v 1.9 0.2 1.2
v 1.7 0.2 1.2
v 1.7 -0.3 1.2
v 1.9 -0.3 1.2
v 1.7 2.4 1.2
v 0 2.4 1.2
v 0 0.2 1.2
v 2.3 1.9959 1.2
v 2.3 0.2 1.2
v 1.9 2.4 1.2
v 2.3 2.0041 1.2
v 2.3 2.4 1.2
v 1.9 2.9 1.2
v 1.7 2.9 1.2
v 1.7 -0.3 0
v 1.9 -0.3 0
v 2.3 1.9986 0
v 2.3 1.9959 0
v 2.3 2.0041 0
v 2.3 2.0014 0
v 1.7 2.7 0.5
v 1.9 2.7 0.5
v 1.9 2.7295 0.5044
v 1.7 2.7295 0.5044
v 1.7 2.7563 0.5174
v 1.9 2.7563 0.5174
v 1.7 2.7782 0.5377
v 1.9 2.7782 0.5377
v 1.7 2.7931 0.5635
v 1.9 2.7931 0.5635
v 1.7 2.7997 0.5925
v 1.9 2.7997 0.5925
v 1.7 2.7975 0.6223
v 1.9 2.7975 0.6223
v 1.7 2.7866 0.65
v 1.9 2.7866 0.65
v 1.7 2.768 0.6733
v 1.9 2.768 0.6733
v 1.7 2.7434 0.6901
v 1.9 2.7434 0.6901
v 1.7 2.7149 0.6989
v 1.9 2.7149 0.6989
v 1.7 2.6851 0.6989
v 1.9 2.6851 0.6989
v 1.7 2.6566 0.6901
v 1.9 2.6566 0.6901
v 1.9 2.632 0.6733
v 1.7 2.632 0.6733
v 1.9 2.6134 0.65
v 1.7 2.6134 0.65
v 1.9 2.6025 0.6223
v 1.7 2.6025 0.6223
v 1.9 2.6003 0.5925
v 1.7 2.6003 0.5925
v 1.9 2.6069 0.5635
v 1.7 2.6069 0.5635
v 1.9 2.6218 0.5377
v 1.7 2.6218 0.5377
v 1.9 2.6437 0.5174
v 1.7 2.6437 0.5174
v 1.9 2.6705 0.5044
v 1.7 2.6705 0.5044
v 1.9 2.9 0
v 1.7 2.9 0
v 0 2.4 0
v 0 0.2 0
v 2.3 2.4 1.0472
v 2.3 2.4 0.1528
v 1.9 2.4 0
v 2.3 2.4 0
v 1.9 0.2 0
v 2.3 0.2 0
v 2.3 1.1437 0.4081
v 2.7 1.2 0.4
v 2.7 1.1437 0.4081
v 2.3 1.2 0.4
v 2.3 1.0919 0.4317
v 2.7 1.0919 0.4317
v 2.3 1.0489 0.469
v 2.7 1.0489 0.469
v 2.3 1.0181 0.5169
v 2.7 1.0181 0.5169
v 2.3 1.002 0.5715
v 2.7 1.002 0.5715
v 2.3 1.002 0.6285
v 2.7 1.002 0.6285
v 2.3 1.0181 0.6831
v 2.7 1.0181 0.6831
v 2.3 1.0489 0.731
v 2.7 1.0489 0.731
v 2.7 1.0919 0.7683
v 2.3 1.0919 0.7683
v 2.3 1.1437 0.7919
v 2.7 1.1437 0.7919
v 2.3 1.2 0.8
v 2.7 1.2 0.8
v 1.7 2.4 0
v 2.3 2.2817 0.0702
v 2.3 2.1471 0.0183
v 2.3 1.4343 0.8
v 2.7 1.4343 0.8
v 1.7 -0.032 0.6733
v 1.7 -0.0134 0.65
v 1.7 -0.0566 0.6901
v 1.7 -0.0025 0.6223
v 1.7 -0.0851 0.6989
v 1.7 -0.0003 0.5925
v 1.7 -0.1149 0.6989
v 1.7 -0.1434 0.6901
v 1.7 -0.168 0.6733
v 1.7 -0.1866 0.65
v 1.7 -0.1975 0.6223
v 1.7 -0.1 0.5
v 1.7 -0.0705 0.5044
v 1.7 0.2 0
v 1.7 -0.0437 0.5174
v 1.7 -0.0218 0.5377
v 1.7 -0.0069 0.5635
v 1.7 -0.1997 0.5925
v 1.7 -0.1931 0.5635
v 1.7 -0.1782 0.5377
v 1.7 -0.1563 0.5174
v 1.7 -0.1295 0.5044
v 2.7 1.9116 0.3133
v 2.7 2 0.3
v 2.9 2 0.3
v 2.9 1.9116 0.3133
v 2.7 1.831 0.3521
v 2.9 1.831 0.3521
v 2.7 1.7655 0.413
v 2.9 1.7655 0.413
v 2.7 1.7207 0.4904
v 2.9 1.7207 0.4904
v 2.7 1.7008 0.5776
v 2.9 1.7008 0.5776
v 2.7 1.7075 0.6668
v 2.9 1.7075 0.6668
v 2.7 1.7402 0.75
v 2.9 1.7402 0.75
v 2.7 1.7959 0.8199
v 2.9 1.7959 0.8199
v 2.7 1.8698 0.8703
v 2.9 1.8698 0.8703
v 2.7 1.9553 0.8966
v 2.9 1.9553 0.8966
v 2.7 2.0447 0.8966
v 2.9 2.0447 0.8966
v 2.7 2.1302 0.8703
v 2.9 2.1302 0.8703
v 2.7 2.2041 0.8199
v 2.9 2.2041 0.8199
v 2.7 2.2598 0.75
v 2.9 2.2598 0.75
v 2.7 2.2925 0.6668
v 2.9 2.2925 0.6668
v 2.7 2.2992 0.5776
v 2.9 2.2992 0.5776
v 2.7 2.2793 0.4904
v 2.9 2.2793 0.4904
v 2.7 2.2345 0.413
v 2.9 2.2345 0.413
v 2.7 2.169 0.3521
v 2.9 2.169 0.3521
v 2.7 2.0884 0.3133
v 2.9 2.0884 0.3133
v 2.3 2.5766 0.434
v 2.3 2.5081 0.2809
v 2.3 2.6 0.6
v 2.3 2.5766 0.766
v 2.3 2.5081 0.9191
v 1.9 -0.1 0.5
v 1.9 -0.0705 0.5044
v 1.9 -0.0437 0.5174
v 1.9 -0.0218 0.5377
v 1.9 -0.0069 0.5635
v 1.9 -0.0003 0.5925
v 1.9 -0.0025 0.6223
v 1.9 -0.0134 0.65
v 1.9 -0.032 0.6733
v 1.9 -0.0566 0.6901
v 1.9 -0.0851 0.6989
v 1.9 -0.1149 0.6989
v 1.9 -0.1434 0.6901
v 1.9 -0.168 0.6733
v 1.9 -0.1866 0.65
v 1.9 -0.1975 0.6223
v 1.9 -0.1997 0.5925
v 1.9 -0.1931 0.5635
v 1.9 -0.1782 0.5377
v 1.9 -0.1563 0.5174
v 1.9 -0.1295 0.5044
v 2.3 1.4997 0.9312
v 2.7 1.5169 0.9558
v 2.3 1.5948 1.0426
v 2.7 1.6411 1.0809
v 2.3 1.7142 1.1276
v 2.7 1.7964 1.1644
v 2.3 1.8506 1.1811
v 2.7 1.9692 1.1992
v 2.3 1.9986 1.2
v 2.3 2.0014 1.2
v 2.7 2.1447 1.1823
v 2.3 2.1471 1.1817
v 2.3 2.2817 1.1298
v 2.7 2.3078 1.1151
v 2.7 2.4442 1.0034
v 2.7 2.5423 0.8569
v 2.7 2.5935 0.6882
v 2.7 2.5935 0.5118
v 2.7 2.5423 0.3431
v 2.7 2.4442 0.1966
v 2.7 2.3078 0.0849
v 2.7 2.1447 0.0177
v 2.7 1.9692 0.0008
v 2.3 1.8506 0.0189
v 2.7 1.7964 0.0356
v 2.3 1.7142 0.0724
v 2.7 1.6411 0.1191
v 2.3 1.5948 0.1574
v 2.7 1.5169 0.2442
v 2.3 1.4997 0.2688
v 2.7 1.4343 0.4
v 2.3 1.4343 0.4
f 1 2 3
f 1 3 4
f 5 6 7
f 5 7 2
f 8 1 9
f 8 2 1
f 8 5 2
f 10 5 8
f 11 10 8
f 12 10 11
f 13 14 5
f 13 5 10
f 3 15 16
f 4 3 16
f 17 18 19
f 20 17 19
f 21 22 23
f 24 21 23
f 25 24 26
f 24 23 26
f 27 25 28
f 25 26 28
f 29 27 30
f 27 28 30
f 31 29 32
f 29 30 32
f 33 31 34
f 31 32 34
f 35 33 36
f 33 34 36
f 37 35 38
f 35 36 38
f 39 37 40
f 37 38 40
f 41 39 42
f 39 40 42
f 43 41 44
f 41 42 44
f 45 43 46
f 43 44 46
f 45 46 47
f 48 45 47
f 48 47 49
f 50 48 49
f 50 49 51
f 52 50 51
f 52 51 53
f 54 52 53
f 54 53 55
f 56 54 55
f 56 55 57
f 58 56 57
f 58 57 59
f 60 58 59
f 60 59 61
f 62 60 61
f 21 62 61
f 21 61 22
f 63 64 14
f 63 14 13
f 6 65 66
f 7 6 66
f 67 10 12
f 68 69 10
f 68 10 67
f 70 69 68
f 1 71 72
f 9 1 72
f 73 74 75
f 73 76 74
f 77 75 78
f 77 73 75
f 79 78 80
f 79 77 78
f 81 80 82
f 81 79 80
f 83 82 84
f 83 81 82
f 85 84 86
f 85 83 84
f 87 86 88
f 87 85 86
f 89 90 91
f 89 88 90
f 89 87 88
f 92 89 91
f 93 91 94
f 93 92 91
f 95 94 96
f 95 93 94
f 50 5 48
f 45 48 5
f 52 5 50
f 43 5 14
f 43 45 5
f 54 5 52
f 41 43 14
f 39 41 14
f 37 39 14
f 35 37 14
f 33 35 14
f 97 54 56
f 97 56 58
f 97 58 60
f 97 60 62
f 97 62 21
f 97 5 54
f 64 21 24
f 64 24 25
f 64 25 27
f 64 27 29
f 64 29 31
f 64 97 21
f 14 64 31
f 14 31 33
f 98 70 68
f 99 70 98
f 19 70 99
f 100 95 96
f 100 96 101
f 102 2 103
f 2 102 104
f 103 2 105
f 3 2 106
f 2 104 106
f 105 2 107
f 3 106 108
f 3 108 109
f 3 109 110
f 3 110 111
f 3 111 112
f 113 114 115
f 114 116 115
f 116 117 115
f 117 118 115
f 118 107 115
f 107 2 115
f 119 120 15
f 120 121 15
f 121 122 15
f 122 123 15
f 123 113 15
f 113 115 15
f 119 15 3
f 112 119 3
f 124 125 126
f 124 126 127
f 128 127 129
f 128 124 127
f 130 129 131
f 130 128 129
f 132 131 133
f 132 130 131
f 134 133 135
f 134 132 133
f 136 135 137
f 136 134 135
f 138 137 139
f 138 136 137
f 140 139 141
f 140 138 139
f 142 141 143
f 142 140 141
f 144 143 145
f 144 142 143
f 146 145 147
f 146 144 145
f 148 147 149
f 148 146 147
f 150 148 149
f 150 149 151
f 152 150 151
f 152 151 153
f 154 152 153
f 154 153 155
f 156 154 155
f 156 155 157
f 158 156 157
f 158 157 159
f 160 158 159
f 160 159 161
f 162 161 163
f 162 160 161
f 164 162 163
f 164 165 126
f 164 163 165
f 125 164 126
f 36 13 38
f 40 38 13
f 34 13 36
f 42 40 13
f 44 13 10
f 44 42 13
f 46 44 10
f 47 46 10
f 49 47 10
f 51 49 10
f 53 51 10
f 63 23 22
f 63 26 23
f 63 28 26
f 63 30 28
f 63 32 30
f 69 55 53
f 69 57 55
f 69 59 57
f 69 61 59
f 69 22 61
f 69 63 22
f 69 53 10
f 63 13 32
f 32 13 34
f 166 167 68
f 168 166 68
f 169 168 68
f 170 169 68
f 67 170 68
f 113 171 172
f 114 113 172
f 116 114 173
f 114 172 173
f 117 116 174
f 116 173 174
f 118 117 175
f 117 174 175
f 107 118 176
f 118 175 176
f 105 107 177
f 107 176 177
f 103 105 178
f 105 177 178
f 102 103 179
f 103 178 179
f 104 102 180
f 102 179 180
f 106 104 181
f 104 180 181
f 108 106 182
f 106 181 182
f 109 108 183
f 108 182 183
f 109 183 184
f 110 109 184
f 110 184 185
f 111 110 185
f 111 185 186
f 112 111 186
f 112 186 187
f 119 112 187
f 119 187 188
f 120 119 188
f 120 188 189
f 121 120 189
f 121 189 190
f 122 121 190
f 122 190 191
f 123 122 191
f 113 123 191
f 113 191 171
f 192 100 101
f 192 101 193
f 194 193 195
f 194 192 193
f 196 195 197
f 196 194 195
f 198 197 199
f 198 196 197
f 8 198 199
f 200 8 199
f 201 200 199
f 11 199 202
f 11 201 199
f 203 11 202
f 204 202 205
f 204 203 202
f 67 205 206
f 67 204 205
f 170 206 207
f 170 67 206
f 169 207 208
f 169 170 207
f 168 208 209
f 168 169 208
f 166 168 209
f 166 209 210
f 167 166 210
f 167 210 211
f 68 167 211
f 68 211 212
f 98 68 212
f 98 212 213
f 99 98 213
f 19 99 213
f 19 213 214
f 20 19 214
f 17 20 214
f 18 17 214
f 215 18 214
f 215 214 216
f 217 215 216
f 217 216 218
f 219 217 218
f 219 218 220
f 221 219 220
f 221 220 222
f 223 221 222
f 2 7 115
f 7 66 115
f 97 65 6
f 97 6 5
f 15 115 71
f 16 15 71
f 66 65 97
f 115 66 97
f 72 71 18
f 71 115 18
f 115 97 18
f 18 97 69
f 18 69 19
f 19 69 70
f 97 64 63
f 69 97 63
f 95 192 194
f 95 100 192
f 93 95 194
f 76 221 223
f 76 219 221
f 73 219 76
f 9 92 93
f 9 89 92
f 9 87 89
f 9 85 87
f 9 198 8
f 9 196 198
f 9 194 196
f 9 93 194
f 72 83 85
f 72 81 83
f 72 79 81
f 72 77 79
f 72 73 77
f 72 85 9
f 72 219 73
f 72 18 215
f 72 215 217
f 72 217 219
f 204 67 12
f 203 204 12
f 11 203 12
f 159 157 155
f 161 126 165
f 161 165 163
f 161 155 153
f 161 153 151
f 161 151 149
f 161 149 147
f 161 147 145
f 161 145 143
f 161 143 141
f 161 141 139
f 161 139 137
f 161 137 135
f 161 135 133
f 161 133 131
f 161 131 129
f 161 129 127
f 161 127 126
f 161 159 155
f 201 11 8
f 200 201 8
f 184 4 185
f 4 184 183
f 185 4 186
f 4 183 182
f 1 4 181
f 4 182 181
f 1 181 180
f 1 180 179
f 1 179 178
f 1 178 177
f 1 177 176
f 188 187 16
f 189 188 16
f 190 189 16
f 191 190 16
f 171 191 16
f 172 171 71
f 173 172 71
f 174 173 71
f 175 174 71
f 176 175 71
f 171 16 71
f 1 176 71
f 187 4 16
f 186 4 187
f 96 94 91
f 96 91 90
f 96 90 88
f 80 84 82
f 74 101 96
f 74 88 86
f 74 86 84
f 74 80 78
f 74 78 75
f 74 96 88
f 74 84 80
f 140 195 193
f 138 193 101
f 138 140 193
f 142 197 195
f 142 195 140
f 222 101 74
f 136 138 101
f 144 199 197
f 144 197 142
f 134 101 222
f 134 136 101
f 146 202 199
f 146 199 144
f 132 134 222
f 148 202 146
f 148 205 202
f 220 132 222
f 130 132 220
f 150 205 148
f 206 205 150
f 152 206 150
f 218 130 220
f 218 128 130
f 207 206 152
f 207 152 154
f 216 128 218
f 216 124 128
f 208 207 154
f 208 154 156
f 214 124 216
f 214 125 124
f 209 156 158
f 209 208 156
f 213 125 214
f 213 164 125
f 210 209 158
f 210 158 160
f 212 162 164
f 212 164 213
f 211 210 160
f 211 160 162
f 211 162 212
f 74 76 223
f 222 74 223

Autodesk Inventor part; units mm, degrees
ref_plane "YZ Plane" through (0, 0, 0) normal (1, 0, 0) x (0, 1, 0)
ref_plane "XZ Plane" through (0, 0, 0) normal (0, 1, 0) x (-1, 0, 0)
ref_plane "XY Plane" through (0, 0, 0) normal (0, 0, 1) x (1, 0, 0)
sketch "Boceto1" plane through (0, 0, 0) normal (0, 0, 1) x (1, 0, 0)
  line L0 (0, 2.4) -> (0, 0.2)
  line L1 (0, 0.2) -> (1.7, 0.2)
  line L2 (0, 2.4) -> (1.7, 2.4)
  line L3 (1.7, 2.4) -> (1.7, 2.9)
  line L4 (1.7, 2.9) -> (1.9, 2.9)
  line L5 (1.9, 2.9) -> (1.9, 2.4)
  line L6 (1.9, 2.4) -> (2.3, 2.4)
  line L7 (2.3, 2.4) -> (2.3, 0.2)
  line L8 (2.3, 2.4) -> (2.7, 2.4)
  line L9 (2.7, 1.2) -> (2.7, 0.8)
  line L10 (2.7, 0.8) -> (2.3, 0.8)
  line L11 (1.7, 0.2) -> (1.7, -0.3)
  line L12 (1.7, -0.3) -> (1.9, -0.3)
  line L13 (1.9, -0.3) -> (1.9, 0.2)
  line L14 (1.9, 0.2) -> (2.3, 0.2)
  line L15 (2.3, 1.2) -> (2.7, 1.2)
  line L16 (2.7, 1.2) -> (2.7, 2.4)
  line L17 (2.7, 1.5) -> (2.9, 1.5)
  line L18 (2.9, 1.5) -> (2.9, 2.1)
  line L19 (2.9, 2.1) -> (2.7, 2.1)
  line L20 (2.3, 0.2) -> (3.3416, 0.2)
  point P0 (0, 0)
extrude "Extrusión1" add sketch "Boceto1" along normal blind 1.2 contours L2 L3 L4 L5 L6 L7 L14 L13 L12 L11 L1 L0
sketch "Boceto2" plane through (2.3, 0.2, 0) normal (1, 0, 0) x (0, 0, -1)
  line L0 (0, 0) -> (0, 2.2) projected
  line L1 (0, 2.2) -> (-1.2, 2.2) projected
  line L2 (-1.2, 0) -> (-1.2, 2.2) projected
  line L3 (-1.2, 2.4) -> (-1.2, 0)
  line L4 (-1.2, 0) -> (0, 0)
  line L5 (0, 2.4) -> (-1.2, 2.4)
  line L6 (-1.2, 2.9) -> (0, 2.9)
  line L7 (-1.2, 2.9) -> (-1.2, 2.4)
  line L8 (-1.2, -0.5) -> (0, -0.5)
  line L9 (0, -0.5) -> (0, 2.9)
  line L10 (-1.2, 0) -> (-1.2, -0.5)
  arc A0 (-0.4, 1.2343) -> (-0.8, 1.2343) centre (-0.6, 1.8) ccw
  circle A1 centre (-0.6, 1.8) radius 0.3
  arc A2 (-0.8, 1) -> (-0.4, 1) centre (-0.6, 1) ccw
  line L11 (-0.8, 1) -> (-0.8, 1.2343)
  line L12 (-0.4, 1) -> (-0.4, 1.2343)
  line L13 (0, 0) -> (-1.2, 0) projected
  point P0 (0, -0.2)
extrude "Extrusión2" add sketch "Boceto2" along normal blind 0.4 contours A0 L12 A2 L11 L1 | L1 A0 | A1
sketch "Boceto3" plane through (2.7, 0.2, 0) normal (1, 0, 0) x (0, 0, -1)
  line L0 (-1.2, 2.4) -> (-1.2, 0)
  line L1 (-1.2, 0) -> (0, 0)
  line L2 (0, 2.4) -> (-1.2, 2.4)
  line L3 (-1.2, 2.9) -> (0, 2.9)
  line L4 (-1.2, 2.9) -> (-1.2, 2.4)
  line L5 (-1.2, -0.5) -> (0, -0.5)
  line L6 (0, -0.5) -> (0, 2.9)
  line L7 (-1.2, 0) -> (-1.2, -0.5)
  arc A0 (-0.4, 1.2343) -> (-0.8, 1.2343) centre (-0.6, 1.8) ccw
  circle A1 centre (-0.6, 1.8) radius 0.3
  arc A2 (-0.8, 1) -> (-0.4, 1) centre (-0.6, 1) ccw
  line L8 (-0.8, 1) -> (-0.8, 1.2343)
  line L9 (-0.4, 1) -> (-0.4, 1.2343)
  arc A3 (-0.4, 1.2343) -> (-0.8, 1.2343) centre (-0.6, 1.8) ccw projected
  line L10 (-0.8, 1.2343) -> (-0.8, 1) projected
  arc A4 (-0.8, 1) -> (-0.4, 1) centre (-0.6, 1) ccw projected
  line L11 (-0.4, 1) -> (-0.4, 1.2343) projected
  point P0 (0, -0.2)
extrude "Extrusión3" add sketch "Boceto3" along normal blind 0.2 contours A1
sketch "Boceto6" plane through (1.9, -0.3, 0) normal (1, 0, 0) x (0, 0, -1)
  line L0 (0, 0) -> (-1.2, 0) projected
  circle A0 centre (-0.6, 0.2) radius 0.1
  line L1 (0, 3.2) -> (-1.2, 3.2) projected
  circle A1 centre (-0.6, 3) radius 0.1
  point P0 (0, 0.3)
extrude "Extrusión4" cut sketch "Boceto6" against normal blind 10
properties part number "learnbotServo"
